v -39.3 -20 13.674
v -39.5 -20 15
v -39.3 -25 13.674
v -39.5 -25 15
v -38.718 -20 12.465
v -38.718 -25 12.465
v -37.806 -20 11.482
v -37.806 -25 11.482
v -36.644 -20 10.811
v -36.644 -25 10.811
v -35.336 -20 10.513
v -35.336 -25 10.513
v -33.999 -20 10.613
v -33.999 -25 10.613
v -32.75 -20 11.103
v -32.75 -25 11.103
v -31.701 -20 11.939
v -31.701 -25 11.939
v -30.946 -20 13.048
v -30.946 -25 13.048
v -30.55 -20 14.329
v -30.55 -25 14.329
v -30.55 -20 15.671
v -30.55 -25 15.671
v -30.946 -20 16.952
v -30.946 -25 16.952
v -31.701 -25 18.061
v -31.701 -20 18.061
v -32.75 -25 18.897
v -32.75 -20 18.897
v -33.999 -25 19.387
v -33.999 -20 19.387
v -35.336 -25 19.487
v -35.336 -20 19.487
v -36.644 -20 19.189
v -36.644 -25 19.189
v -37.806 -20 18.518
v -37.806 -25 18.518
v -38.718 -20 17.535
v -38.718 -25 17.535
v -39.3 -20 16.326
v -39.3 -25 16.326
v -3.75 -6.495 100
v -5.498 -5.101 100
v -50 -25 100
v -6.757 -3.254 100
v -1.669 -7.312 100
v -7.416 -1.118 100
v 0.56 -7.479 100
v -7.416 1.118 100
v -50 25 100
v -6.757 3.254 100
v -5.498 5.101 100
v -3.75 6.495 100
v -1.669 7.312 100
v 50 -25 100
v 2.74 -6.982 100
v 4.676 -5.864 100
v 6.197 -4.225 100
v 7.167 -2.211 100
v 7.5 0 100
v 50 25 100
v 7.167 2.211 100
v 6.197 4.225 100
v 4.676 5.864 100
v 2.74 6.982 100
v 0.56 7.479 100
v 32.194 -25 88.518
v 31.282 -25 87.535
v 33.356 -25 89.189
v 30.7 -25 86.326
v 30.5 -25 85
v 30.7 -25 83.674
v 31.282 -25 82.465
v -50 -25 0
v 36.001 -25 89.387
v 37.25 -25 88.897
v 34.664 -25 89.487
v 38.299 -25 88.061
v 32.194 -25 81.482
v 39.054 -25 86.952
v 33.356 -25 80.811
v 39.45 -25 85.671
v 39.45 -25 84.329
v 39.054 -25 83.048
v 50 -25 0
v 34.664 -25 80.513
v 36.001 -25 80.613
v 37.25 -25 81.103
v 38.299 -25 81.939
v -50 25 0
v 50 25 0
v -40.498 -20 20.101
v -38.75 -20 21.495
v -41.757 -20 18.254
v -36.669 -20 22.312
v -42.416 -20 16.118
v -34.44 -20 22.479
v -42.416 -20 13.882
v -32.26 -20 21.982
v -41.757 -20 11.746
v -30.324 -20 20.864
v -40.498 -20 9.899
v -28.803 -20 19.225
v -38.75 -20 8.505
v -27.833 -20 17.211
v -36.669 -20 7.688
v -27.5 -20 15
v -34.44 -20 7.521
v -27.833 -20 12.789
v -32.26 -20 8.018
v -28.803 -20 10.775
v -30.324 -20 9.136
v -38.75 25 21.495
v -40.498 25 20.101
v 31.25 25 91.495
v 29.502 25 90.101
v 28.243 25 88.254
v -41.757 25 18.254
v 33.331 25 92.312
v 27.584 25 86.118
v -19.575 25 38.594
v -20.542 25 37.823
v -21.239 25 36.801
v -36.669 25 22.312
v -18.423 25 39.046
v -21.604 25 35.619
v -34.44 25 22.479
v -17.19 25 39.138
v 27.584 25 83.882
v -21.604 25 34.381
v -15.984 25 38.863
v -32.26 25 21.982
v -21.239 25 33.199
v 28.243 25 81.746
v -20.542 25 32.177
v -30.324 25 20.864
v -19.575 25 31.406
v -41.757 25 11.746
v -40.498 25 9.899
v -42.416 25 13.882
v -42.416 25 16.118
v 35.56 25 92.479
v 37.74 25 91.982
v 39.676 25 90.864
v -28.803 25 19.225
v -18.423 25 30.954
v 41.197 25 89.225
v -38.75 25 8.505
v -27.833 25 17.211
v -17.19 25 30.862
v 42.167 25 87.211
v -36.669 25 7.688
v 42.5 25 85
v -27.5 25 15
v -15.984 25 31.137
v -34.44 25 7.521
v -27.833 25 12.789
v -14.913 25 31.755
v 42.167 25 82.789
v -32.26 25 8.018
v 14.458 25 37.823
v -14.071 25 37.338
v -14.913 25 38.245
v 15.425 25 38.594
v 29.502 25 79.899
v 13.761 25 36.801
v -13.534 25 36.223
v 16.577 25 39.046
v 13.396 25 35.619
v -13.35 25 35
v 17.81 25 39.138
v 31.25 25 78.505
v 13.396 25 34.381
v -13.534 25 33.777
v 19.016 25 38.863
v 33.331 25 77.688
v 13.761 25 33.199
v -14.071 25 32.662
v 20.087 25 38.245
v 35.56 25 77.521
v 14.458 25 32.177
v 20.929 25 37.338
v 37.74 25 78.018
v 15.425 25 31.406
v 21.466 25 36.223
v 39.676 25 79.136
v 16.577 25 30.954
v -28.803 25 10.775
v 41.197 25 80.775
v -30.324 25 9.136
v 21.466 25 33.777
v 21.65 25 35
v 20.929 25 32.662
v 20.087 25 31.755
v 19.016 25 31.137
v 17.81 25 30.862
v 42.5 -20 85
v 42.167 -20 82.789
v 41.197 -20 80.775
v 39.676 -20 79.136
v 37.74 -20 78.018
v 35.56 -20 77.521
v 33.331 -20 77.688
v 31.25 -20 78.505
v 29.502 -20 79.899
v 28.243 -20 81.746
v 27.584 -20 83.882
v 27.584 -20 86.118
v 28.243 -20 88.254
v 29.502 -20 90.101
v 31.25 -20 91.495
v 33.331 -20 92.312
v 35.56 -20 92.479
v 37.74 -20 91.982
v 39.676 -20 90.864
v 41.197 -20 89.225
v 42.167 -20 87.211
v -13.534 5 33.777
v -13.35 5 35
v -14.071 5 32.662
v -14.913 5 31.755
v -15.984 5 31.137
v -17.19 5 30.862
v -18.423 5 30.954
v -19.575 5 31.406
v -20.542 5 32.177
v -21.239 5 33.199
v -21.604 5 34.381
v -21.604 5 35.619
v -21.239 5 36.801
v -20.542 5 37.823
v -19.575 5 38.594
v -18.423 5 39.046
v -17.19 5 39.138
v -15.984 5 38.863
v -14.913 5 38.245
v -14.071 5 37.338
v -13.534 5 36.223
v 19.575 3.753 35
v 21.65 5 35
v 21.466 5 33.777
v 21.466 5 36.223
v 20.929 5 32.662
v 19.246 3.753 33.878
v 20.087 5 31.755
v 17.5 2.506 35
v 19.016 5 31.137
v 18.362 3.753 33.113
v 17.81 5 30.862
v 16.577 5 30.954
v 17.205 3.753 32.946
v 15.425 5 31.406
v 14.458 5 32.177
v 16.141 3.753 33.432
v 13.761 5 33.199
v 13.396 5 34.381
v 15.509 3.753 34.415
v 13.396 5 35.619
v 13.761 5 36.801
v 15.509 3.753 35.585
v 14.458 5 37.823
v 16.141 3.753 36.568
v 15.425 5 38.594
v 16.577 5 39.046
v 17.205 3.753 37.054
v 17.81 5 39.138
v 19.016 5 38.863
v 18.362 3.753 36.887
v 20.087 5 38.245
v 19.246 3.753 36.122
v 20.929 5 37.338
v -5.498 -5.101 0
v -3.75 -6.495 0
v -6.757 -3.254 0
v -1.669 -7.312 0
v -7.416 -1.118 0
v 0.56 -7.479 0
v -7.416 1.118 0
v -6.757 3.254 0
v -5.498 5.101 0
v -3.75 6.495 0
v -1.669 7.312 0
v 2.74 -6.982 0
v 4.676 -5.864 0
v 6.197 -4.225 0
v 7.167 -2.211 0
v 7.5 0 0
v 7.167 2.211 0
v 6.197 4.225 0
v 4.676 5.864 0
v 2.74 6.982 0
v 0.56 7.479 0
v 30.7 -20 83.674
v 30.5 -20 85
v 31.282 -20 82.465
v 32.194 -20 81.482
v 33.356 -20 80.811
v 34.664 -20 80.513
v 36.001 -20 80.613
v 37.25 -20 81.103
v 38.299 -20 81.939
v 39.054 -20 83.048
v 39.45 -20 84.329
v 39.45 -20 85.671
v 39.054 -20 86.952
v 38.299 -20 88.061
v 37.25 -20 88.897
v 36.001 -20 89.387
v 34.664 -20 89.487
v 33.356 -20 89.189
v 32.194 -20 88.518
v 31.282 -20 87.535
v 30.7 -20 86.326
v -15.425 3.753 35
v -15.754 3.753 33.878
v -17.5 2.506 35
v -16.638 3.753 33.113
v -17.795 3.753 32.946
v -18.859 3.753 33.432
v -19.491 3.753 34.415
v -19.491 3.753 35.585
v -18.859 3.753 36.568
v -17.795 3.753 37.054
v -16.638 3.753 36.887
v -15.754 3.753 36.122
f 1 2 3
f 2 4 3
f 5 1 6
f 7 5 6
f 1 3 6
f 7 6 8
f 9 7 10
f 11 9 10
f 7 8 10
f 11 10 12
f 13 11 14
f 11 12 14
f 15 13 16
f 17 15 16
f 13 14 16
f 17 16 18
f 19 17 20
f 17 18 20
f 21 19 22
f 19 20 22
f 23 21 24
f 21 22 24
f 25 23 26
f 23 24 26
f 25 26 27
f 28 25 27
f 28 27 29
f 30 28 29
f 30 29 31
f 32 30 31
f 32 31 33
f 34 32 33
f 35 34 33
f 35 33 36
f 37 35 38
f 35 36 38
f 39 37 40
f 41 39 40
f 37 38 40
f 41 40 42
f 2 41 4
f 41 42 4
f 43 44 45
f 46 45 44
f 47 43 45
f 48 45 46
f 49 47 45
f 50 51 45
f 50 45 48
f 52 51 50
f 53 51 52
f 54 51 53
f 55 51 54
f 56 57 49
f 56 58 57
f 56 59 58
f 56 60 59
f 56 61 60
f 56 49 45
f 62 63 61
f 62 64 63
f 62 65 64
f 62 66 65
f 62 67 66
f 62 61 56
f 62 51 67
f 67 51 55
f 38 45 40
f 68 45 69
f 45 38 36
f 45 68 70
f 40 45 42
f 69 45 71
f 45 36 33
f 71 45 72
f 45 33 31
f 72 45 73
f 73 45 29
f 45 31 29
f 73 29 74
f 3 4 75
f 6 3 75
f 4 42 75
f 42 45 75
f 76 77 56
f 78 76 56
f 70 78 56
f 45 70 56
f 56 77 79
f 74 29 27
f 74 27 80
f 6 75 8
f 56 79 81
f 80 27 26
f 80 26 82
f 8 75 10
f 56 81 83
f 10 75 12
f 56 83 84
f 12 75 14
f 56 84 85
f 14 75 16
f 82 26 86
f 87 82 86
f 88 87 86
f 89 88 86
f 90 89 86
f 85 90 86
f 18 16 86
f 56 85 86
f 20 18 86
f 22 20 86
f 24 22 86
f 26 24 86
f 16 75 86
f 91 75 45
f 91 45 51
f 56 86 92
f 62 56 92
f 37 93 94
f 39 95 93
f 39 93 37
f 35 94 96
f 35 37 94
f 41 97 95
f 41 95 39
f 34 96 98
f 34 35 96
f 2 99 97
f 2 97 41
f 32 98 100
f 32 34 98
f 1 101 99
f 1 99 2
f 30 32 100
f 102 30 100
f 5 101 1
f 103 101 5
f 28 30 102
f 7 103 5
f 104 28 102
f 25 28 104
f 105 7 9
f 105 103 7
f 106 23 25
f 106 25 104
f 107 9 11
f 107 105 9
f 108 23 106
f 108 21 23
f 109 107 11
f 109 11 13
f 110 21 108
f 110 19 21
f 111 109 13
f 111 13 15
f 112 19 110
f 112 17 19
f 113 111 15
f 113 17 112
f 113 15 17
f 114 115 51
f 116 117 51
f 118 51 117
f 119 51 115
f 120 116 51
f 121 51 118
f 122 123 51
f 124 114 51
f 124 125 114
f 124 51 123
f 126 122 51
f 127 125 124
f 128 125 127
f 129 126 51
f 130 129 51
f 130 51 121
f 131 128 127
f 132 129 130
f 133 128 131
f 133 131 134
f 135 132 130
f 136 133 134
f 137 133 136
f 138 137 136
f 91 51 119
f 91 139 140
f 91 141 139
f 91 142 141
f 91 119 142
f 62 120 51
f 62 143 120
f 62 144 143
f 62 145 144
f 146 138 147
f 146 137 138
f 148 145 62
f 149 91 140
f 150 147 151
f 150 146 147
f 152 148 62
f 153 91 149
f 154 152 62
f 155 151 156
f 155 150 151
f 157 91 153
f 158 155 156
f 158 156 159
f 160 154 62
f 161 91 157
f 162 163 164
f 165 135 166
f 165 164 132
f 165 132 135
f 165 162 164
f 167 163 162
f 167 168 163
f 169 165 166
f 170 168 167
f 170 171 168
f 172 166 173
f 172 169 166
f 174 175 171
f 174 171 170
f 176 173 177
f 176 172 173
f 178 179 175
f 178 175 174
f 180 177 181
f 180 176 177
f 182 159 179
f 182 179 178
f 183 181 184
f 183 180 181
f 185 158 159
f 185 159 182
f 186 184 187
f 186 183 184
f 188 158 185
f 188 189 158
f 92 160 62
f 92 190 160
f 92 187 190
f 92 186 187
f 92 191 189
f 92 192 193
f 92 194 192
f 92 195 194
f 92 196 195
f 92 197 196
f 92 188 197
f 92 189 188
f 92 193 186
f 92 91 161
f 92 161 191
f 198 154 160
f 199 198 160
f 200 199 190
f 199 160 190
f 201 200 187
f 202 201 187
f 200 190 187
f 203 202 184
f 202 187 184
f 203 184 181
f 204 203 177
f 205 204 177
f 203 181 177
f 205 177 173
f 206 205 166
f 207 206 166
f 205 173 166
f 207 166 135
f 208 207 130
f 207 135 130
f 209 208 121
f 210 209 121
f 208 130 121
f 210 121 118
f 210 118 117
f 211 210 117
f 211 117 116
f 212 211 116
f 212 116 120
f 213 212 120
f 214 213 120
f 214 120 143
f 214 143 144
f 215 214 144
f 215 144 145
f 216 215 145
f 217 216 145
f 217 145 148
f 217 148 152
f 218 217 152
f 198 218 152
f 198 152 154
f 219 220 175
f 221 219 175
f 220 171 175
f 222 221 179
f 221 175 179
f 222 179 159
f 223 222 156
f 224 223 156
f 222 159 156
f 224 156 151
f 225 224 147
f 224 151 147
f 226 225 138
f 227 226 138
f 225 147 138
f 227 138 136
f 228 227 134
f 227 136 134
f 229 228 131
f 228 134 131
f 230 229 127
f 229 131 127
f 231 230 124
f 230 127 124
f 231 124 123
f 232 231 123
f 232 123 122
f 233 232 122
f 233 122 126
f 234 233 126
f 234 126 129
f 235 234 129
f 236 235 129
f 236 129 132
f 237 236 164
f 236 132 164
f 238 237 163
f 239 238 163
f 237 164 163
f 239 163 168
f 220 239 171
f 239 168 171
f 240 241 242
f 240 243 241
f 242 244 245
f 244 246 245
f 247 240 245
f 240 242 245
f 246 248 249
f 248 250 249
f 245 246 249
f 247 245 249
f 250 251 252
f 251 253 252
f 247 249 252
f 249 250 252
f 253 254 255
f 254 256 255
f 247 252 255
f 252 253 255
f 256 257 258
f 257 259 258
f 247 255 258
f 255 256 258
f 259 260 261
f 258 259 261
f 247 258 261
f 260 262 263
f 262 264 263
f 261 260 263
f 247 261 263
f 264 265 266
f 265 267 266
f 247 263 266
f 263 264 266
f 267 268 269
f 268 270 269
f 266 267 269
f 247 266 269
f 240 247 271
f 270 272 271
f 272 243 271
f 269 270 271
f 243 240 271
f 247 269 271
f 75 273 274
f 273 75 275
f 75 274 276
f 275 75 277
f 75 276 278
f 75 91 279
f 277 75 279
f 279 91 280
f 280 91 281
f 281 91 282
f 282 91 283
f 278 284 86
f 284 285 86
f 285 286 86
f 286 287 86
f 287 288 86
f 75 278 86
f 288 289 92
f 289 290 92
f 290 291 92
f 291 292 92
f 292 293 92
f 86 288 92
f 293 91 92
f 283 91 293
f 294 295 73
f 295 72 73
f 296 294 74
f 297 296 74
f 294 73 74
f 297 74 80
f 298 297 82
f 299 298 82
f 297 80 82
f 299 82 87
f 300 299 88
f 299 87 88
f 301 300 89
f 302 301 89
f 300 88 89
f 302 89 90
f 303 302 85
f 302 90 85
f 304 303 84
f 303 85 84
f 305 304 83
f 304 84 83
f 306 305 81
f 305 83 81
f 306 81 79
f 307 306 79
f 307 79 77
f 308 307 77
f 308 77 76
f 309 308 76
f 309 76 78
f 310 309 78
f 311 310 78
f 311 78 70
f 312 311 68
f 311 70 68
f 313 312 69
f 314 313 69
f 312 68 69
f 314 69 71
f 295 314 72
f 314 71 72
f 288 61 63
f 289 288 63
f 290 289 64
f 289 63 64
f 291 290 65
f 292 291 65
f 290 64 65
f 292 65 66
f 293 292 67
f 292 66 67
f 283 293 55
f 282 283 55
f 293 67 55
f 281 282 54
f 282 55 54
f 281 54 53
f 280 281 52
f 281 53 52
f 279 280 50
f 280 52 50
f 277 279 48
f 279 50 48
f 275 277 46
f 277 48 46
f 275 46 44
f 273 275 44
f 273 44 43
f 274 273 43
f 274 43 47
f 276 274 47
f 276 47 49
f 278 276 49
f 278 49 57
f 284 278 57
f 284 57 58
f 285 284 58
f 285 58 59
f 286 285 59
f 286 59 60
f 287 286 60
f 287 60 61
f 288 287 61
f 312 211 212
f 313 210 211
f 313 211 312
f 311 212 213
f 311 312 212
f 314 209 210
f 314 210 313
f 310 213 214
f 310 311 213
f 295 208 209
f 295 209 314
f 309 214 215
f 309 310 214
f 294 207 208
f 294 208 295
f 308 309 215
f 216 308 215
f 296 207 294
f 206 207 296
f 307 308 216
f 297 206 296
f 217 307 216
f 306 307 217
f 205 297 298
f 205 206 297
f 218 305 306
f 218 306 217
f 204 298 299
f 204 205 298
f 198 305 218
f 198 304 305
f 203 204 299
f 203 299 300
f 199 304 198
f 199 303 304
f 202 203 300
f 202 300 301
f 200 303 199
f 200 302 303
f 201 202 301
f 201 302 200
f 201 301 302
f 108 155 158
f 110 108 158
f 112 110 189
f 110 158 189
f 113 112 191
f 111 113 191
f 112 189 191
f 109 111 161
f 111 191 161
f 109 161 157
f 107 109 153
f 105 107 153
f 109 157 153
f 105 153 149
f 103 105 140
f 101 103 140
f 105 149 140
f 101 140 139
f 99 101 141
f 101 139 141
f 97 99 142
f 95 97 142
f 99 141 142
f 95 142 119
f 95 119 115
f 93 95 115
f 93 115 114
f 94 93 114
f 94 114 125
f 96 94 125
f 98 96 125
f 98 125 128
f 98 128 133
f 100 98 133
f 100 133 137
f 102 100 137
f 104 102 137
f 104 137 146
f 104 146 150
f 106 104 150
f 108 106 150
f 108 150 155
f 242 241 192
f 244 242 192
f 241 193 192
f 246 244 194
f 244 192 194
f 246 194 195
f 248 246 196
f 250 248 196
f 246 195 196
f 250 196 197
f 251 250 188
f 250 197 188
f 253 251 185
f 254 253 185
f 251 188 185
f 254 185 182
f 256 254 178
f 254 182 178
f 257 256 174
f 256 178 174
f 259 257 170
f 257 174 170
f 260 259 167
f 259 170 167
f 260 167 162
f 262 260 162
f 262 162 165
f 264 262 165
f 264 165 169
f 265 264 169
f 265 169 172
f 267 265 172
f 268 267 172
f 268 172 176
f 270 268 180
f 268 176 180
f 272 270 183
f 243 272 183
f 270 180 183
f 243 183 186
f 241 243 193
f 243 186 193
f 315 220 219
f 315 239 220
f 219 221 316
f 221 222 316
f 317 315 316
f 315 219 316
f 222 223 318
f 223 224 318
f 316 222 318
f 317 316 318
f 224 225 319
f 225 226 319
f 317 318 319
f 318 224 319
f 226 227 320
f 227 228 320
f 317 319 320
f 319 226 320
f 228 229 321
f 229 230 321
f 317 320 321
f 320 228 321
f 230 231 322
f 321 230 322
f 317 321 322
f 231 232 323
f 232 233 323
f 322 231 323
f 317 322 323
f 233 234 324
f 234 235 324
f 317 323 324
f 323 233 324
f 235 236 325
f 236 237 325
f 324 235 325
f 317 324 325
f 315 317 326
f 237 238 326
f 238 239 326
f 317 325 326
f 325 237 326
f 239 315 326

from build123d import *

# Parameters (mm, degrees)
SKIZZE1_W                                           = 100
SKIZZE1_H                                           = 50
AUFSATZ_LINEAR_AUSTRAGEN1_DEPTH                     = 100
STIRNSENKUNG_F_R_M8_SENKSCHRAUBE_KOPF_B_D           = 9
STIRNSENKUNG_F_R_M8_SENKSCHRAUBE_KOPF_B_CBORE_D     = 15
STIRNSENKUNG_F_R_M8_SENKSCHRAUBE_KOPF_B_CBORE_DEPTH = 45
STIRNSENKUNG_F_R_M8_SENKSCHRAUBE_KO_2_D             = 9
STIRNSENKUNG_F_R_M8_SENKSCHRAUBE_KO_2_CBORE_D       = 15
STIRNSENKUNG_F_R_M8_SENKSCHRAUBE_KO_2_CBORE_DEPTH   = 116


# Read off the part's stored shape, not the designer's step: Kernloch für M8 Helicoil1
with BuildPart() as part:
    # Skizze1 → Aufsatz-Linear austragen1 (new body)
    with BuildSketch(Plane.XY):
        Rectangle(SKIZZE1_W, SKIZZE1_H)
    extrude(amount=AUFSATZ_LINEAR_AUSTRAGEN1_DEPTH)

    # Stirnsenkung f_r M8 Senkschraube _Kopf B (through all)
    with Locations(Plane(origin=(0, 25, 0), x_dir=(1, 0, 0), z_dir=(0, 1, 0))):
        with Locations((35, -85), (-35, -15)):
            CounterBoreHole(STIRNSENKUNG_F_R_M8_SENKSCHRAUBE_KOPF_B_D / 2, STIRNSENKUNG_F_R_M8_SENKSCHRAUBE_KOPF_B_CBORE_D / 2, STIRNSENKUNG_F_R_M8_SENKSCHRAUBE_KOPF_B_CBORE_DEPTH)

    # Stirnsenkung f_r M8 Senkschraube _Ko 2 (through all)
    with Locations(Plane.XY.offset(100)):
        with Locations((0, 0)):
            CounterBoreHole(STIRNSENKUNG_F_R_M8_SENKSCHRAUBE_KO_2_D / 2, STIRNSENKUNG_F_R_M8_SENKSCHRAUBE_KO_2_CBORE_D / 2, STIRNSENKUNG_F_R_M8_SENKSCHRAUBE_KO_2_CBORE_DEPTH)

    # Kernloch für M8 Helicoil1 outline → Kernloch für M8 Helicoil1 (revolve, cut)
    with BuildSketch(Plane(origin=(17.5, 0, 35), x_dir=(1, 0, 0), z_dir=(0, 0, 1))):
        Polygon((0, 25), (0, 2.506428431), (4.15, 5), (4.15, 25), align=None)
    revolve(axis=Axis((17.5, 0, 35), (0, 1, 0)), mode=Mode.SUBTRACT)

    # Kernloch f_r M8 Helicoil1 2 outline → Kernloch f_r M8 Helicoil1 2 (revolve, cut)
    with BuildSketch(Plane(origin=(-17.5, 0, 35), x_dir=(1, 0, 0), z_dir=(0, 0, 1))):
        Polygon((0, 25), (0, 2.506428431), (4.15, 5), (4.15, 25), align=None)
    revolve(axis=Axis((-17.5, 0, 35), (0, 1, 0)), mode=Mode.SUBTRACT)


solid = part.part
